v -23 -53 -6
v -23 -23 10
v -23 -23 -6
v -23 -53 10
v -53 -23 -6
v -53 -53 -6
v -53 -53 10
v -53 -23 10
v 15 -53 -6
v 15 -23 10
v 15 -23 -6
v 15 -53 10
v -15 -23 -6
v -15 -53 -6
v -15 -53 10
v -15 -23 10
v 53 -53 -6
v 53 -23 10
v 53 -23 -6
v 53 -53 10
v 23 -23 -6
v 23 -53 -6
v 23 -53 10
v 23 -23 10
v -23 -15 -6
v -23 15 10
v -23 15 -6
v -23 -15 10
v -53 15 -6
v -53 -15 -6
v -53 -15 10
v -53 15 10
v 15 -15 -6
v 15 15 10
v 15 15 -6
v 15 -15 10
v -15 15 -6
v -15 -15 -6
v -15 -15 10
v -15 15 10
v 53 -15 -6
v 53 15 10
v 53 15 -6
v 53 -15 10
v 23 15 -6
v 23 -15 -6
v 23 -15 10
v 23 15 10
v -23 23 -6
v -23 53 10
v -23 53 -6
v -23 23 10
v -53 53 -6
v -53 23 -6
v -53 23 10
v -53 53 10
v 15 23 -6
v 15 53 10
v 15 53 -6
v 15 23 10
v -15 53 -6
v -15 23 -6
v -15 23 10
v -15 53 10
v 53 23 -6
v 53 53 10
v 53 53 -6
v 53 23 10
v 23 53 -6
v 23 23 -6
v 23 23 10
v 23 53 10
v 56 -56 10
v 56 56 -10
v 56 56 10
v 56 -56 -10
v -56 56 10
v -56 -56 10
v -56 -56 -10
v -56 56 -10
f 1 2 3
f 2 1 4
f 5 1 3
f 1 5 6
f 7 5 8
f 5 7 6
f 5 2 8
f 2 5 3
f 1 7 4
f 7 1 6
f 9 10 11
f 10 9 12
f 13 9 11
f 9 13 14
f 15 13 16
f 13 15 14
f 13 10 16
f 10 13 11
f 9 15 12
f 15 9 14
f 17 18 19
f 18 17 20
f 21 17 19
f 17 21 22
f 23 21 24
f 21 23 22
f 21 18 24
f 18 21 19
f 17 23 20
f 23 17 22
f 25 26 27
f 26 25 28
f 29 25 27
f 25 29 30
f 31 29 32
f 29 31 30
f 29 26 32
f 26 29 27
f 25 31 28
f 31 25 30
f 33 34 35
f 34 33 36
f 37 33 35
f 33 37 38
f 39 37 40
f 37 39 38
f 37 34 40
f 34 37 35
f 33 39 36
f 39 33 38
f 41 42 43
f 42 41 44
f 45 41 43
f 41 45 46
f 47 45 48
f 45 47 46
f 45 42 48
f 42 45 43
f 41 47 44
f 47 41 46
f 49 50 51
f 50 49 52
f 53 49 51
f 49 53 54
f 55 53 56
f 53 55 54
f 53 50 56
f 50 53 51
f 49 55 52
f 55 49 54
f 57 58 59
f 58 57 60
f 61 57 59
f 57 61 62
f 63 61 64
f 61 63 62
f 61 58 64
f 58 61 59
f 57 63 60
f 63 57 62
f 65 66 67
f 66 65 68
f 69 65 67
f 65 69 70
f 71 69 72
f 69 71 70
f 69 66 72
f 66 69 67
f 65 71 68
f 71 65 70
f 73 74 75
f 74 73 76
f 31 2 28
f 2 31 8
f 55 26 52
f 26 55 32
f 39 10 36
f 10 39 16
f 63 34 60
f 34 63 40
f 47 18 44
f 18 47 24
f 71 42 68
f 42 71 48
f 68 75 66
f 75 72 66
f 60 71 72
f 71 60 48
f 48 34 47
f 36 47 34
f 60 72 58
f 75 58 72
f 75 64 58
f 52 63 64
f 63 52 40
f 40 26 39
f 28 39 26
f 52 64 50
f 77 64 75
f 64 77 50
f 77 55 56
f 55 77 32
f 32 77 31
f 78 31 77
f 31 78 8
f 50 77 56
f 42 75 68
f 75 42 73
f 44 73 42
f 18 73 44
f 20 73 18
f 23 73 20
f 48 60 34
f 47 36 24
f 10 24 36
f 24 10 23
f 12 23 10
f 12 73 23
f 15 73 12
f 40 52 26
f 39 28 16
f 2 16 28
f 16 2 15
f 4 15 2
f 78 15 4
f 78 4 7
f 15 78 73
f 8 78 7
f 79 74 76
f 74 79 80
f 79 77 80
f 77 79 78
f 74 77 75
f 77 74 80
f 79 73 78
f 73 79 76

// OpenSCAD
$fn = 32;

// ----------------------------------------------------------------------
// Pocket plate 112 x 112 x 20
// 3 x 3 pockets 30 mm square, 16 mm deep
// ----------------------------------------------------------------------

// --- parameters (mm) ---
thickness = 20;  // plate thickness
floor_t = 4;     // material left under each pocket
pocket = 30;     // pocket side length
pitch_x = 38;    // pocket pitch along X
pitch_y = 38;    // pocket pitch along Y
cols = 3;        // pockets per row
rows = 3;        // rows of pockets

// --- derived feature positions (mm) ---
depth = thickness - floor_t;        // = 16   pocket depth, down to the floor
span_x = (cols - 1) * pitch_x;      // = 76   distance between outer pockets
span_y = (rows - 1) * pitch_y;      // = 76   distance between outer pocket rows
origin_x = -span_x / 2;             // = -38   X of the first pocket
origin_y = -span_y / 2;             // = -38   Y of the first pocket
plate = [span_x + pocket + 6, span_y + pocket + 6, thickness];  // = [112, 112, 20]   overall size: pockets plus 3 mm of wall on each side
feature_centers = [
  [origin_x + 0 * pitch_x, origin_y + 0 * pitch_y],
  [origin_x + 1 * pitch_x, origin_y + 0 * pitch_y],
  [origin_x + 2 * pitch_x, origin_y + 0 * pitch_y],
  [origin_x + 0 * pitch_x, origin_y + 1 * pitch_y],
  [origin_x + 1 * pitch_x, origin_y + 1 * pitch_y],
  [origin_x + 2 * pitch_x, origin_y + 1 * pitch_y],
  [origin_x + 0 * pitch_x, origin_y + 2 * pitch_y],
  [origin_x + 1 * pitch_x, origin_y + 2 * pitch_y],
  [origin_x + 2 * pitch_x, origin_y + 2 * pitch_y]
];   // pocket centres, used verbatim by the cutter loop

// plate outline, then one pocket per centre in feature_centers
difference() {
  cube(plate, center = true);
  for (centre = feature_centers)
    translate([centre[0] - pocket / 2, centre[1] - pocket / 2, plate[2] / 2 - depth])
      cube([pocket, pocket, depth + 1]);  // centred on the declared pocket centre
}
